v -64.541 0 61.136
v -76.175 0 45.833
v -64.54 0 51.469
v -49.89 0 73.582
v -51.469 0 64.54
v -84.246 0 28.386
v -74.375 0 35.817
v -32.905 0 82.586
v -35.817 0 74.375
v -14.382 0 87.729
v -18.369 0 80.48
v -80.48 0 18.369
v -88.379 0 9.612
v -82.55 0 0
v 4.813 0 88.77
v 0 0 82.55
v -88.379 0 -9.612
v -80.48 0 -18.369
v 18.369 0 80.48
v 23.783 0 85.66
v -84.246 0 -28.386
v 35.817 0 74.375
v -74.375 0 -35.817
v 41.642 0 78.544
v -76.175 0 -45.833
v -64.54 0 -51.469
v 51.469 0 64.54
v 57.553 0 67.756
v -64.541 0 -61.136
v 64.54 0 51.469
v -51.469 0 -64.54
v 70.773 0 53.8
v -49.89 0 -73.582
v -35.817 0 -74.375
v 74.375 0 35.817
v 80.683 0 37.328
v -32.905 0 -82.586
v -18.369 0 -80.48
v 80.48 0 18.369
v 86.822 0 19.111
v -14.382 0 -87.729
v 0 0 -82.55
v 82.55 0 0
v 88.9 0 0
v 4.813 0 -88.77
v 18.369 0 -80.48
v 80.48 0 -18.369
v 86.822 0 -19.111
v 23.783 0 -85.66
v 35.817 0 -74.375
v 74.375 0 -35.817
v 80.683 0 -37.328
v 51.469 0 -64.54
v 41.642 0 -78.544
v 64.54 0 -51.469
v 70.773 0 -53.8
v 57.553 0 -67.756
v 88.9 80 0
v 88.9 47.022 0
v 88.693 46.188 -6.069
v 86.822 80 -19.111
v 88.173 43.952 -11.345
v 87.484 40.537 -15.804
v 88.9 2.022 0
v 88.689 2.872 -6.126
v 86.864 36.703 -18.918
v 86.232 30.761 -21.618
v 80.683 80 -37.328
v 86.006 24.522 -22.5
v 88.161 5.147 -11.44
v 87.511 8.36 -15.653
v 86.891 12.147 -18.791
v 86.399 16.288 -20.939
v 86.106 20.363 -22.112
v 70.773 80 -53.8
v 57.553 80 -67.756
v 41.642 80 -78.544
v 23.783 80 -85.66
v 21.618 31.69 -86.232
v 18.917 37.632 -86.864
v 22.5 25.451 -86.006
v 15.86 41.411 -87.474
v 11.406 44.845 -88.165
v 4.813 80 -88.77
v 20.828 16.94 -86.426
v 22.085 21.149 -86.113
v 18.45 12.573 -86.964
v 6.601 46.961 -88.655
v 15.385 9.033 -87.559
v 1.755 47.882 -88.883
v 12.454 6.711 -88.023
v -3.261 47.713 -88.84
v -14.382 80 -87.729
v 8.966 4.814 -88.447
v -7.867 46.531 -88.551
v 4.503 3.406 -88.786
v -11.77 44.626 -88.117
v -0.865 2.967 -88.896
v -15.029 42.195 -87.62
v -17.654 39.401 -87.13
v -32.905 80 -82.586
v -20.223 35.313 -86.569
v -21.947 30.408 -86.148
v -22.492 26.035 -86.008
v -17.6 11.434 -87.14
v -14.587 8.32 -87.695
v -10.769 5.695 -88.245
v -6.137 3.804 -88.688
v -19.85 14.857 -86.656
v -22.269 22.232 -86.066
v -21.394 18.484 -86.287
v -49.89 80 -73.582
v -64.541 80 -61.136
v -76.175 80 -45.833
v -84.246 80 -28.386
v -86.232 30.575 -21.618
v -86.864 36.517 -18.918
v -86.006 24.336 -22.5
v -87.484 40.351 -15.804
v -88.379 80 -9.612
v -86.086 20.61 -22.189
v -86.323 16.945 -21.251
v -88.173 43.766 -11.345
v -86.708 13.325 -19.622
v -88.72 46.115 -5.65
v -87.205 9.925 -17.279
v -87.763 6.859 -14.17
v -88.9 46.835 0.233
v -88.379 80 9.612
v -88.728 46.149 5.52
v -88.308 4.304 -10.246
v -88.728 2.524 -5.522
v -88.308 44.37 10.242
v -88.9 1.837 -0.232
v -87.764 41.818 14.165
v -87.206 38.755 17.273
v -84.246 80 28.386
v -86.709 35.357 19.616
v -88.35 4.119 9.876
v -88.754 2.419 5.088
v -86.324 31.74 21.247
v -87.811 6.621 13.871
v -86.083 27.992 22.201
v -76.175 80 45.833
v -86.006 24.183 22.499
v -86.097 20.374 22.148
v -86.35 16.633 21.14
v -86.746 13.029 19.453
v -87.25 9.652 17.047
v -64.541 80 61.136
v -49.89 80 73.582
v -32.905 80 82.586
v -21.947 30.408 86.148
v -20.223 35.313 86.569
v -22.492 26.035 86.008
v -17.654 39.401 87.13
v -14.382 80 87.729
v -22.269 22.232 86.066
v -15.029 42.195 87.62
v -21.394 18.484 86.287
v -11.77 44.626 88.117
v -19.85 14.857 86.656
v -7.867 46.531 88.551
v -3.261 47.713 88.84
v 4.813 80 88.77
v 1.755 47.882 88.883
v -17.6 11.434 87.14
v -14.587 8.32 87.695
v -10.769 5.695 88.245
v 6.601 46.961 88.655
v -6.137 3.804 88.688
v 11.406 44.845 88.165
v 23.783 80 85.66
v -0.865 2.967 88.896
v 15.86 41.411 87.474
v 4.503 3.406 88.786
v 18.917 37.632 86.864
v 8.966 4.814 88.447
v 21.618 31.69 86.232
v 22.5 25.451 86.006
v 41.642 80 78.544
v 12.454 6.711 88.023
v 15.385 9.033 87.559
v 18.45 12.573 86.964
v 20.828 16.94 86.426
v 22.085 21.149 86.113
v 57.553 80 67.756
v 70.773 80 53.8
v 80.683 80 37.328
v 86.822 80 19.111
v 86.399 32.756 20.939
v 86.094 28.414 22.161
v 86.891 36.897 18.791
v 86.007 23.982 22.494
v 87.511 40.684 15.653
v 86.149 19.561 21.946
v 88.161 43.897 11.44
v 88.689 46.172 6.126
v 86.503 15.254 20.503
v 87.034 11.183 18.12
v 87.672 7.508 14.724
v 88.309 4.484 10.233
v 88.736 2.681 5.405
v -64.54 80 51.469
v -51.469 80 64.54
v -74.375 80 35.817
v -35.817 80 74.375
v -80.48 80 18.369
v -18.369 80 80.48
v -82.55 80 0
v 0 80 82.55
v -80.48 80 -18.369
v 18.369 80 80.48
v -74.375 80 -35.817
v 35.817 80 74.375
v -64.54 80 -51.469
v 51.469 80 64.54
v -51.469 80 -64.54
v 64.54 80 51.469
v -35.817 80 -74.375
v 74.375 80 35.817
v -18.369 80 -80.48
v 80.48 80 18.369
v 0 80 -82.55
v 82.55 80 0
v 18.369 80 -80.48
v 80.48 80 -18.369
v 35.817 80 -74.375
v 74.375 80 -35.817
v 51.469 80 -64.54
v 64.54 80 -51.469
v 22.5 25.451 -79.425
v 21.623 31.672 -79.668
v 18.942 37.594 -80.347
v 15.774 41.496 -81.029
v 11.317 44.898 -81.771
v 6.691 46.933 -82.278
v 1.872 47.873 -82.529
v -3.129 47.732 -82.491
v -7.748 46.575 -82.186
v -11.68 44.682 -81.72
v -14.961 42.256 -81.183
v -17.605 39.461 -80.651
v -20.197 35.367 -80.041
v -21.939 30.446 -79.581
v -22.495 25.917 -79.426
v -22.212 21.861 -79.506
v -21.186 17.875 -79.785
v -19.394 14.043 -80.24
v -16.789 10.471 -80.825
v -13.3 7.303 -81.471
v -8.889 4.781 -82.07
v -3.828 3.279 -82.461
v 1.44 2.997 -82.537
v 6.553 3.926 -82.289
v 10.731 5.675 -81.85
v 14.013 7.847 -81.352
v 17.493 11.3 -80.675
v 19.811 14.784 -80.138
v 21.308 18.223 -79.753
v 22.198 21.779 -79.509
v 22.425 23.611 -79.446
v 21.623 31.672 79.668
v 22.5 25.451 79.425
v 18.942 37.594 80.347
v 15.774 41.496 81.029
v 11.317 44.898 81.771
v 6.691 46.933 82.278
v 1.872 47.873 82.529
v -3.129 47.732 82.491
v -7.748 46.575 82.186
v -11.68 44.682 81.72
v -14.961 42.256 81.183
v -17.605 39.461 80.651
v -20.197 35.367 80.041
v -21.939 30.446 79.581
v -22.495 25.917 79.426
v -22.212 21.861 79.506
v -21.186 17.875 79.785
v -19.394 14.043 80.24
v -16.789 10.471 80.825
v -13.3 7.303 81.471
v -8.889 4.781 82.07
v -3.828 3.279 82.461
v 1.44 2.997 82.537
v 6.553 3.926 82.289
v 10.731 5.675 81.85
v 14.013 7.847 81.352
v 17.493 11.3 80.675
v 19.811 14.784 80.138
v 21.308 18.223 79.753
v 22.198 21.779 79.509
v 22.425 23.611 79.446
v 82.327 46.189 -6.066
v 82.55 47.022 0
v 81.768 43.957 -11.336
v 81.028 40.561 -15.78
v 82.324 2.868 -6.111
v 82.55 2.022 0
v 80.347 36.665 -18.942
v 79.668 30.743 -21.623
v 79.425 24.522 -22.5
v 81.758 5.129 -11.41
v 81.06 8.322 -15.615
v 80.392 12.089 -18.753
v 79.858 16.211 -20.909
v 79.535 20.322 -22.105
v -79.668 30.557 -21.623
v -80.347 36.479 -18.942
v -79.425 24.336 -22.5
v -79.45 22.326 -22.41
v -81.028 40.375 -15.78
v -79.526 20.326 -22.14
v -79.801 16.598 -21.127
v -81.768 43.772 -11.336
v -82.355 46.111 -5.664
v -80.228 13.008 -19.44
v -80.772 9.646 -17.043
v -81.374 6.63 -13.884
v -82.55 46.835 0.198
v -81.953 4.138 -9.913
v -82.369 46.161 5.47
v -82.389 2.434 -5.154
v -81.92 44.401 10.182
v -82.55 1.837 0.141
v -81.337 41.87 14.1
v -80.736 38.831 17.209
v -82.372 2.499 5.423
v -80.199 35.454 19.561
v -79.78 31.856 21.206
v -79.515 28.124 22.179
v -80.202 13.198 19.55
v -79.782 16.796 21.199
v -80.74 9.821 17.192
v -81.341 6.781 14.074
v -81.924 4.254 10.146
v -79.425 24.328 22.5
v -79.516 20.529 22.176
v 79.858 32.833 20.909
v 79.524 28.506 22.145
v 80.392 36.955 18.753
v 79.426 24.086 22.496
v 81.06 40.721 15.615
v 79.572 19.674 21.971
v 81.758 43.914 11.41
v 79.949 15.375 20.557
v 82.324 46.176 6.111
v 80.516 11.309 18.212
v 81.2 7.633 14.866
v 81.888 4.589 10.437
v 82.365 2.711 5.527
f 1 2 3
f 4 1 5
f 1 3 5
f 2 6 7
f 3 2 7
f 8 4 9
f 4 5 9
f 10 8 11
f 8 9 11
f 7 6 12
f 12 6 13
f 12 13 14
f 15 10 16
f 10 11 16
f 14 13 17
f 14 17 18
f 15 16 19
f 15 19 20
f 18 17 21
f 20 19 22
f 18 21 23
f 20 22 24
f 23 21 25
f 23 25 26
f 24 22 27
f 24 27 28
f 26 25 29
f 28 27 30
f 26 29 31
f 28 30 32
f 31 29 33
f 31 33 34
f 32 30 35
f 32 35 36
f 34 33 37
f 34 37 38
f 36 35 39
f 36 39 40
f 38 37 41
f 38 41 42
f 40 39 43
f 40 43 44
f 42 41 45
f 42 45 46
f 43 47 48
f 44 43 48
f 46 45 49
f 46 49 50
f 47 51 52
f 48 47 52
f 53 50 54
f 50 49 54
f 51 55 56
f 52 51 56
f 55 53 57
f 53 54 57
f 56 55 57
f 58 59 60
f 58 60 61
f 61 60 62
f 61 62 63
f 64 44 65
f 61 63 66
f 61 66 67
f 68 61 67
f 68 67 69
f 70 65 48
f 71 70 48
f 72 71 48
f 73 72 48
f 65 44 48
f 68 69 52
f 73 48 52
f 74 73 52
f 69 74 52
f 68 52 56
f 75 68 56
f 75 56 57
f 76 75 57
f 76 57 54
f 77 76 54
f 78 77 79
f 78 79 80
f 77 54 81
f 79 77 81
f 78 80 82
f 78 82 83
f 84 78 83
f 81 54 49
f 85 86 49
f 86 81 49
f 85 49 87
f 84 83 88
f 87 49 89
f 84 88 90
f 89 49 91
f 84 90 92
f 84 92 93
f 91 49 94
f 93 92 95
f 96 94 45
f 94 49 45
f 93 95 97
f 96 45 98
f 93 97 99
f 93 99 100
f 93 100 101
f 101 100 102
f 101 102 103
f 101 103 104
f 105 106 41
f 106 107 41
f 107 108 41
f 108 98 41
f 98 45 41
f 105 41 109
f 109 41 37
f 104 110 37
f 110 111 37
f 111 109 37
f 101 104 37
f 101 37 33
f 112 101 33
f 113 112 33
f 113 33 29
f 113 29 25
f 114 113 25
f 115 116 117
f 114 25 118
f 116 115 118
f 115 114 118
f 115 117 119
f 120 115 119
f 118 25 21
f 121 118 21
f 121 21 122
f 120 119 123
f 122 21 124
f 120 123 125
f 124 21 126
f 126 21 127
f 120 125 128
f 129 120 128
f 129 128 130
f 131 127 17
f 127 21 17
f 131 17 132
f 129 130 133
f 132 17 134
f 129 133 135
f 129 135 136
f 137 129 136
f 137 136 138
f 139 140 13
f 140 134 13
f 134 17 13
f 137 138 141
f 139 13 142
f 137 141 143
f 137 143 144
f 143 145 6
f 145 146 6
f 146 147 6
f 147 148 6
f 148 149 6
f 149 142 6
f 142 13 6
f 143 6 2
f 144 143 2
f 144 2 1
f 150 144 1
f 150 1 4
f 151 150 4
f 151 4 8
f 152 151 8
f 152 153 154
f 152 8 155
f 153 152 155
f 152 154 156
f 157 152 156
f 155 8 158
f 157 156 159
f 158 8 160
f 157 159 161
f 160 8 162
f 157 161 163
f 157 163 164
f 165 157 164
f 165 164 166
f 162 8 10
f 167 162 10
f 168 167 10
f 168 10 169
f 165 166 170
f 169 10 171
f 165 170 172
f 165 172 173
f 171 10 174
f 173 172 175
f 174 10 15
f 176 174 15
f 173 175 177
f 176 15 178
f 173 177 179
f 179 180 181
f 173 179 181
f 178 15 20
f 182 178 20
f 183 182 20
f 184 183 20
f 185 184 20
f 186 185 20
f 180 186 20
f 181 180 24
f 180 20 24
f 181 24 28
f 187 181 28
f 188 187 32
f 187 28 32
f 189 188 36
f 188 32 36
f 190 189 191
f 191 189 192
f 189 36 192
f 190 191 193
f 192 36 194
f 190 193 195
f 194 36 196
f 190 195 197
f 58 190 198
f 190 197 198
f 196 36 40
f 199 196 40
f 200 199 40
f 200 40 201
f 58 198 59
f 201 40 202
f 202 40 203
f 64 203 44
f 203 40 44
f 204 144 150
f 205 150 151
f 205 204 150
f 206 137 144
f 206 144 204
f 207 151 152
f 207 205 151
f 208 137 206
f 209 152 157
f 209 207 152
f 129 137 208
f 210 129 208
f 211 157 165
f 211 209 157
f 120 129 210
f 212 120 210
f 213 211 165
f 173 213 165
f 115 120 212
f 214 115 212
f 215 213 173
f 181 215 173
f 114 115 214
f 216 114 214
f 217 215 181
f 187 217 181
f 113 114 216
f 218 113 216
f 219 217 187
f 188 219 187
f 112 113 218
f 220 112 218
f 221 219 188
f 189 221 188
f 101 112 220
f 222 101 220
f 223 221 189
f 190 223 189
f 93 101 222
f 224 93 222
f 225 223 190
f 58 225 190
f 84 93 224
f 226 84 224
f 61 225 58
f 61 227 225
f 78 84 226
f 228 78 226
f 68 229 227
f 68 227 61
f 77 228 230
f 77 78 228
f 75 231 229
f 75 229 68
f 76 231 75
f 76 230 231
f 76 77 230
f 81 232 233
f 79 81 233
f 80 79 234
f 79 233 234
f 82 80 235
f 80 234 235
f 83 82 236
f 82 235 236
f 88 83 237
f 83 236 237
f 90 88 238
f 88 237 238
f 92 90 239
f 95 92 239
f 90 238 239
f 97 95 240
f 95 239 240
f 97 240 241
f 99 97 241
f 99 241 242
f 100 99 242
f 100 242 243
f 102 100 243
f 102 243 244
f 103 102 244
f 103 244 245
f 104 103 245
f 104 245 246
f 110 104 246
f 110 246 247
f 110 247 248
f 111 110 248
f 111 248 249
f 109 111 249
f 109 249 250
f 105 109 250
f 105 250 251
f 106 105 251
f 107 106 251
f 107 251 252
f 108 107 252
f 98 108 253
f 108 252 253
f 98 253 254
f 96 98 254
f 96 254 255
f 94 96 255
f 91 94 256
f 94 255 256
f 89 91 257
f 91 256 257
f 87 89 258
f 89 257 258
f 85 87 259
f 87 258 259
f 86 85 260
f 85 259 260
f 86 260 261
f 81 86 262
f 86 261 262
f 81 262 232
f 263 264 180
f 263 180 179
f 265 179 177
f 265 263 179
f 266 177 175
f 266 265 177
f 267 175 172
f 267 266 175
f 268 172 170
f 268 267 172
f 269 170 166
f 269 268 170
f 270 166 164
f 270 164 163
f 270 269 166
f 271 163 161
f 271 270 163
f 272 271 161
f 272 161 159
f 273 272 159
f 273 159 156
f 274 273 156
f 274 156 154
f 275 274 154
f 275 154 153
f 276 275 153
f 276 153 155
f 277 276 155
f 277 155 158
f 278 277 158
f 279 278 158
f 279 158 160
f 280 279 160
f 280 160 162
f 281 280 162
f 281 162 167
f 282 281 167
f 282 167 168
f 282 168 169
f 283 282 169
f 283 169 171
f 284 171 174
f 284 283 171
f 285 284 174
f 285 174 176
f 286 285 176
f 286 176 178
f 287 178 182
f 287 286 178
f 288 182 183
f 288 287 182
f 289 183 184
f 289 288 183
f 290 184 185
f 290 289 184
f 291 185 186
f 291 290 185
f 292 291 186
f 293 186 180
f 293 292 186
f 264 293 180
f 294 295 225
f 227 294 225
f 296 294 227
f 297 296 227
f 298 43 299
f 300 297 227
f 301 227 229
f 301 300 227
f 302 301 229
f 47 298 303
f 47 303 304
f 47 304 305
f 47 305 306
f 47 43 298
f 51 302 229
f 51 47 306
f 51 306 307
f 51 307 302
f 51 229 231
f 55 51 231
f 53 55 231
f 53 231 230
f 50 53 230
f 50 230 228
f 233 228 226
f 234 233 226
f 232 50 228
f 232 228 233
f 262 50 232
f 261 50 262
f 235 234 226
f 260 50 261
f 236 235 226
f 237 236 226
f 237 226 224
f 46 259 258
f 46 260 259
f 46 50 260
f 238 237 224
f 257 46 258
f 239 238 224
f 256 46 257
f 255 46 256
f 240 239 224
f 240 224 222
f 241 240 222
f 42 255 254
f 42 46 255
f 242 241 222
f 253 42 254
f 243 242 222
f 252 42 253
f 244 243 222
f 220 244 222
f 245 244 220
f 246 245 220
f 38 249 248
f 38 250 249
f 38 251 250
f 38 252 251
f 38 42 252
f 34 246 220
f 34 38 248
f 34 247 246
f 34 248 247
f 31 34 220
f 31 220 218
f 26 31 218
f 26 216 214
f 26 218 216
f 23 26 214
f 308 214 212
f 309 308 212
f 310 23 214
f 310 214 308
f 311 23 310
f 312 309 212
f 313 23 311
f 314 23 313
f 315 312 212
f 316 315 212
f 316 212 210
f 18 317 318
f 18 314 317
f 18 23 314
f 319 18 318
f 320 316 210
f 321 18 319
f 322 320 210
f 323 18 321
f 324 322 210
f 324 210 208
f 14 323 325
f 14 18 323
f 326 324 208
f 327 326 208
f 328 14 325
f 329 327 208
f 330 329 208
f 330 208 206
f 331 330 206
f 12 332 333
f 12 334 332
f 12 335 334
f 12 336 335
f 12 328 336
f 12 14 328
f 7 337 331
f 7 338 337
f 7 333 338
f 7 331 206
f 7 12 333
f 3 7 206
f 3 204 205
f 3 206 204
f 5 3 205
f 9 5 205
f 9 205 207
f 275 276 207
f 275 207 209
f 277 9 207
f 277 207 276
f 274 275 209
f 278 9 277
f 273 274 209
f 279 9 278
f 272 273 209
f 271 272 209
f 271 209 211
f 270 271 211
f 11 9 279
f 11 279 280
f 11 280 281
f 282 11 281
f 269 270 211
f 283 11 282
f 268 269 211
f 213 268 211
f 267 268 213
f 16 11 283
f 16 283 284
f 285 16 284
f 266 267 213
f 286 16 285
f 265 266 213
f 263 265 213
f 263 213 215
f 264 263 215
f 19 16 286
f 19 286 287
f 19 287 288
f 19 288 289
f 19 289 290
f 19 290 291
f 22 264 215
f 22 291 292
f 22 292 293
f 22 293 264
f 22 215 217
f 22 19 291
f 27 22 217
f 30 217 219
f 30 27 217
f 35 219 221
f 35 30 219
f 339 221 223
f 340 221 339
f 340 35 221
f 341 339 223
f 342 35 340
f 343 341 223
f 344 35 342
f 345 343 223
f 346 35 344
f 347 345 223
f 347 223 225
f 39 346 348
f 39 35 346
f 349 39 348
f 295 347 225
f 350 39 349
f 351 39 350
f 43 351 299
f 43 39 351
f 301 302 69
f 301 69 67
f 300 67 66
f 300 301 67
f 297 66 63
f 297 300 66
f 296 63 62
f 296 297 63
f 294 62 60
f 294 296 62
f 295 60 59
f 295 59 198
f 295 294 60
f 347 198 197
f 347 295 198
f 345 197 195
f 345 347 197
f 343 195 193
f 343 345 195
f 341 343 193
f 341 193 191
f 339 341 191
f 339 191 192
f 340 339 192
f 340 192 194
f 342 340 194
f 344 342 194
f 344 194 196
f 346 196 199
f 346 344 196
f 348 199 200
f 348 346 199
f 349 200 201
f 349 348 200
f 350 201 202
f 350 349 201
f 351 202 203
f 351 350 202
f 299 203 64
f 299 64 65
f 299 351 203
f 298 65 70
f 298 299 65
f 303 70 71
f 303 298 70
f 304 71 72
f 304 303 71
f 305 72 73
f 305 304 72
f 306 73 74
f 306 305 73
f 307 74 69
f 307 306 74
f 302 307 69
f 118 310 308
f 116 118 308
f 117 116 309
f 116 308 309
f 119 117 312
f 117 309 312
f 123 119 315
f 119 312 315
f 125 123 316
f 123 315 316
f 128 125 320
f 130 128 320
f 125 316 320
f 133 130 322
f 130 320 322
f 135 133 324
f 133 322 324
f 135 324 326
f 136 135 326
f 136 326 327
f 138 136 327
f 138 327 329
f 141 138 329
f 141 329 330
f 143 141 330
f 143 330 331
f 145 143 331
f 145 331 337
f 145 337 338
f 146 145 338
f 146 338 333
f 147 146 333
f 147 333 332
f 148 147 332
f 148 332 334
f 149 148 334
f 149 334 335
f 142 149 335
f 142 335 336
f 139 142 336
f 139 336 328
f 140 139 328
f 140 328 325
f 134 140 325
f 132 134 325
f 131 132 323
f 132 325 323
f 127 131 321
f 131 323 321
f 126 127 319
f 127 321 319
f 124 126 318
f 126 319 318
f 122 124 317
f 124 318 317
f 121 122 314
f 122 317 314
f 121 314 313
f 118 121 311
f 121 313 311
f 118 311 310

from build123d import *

# Parameters (mm, degrees)
SKETCH1_R           = 88.9
BOSS_EXTRUDE1_DEPTH = 80
SKETCH2_R           = 82.55
CUT_EXTRUDE4_DEPTH  = 90
SKETCH12_R          = 22.5
CUT_EXTRUDE5_DEPTH  = 115.64
SKETCH13_R          = 22.5
CUT_EXTRUDE6_DEPTH  = 115.64
SKETCH14_R          = 22.5
CUT_EXTRUDE7_DEPTH  = 99.64
CUT_EXTRUDE8_START  = 137.64
SKETCH15_R          = 22.5
CUT_EXTRUDE8_DEPTH  = 137.64


with BuildPart() as part:
    # Sketch1 → Boss-Extrude1 (new body)
    with BuildSketch(Plane(origin=(0, 0, 0), x_dir=(1, 0, 0), z_dir=(0, 1, 0))):
        Circle(SKETCH1_R)
    extrude(amount=BOSS_EXTRUDE1_DEPTH)

    # Sketch2 → Cut-Extrude4 (cut)
    with BuildSketch(Plane(origin=(0, 0, 0), x_dir=(1, 0, 0), z_dir=(0, 1, 0))):
        Circle(SKETCH2_R)
    extrude(amount=CUT_EXTRUDE4_DEPTH, mode=Mode.SUBTRACT)

    # Sketch12 → Cut-Extrude5 (cut)
    with BuildSketch(Plane(origin=(0, 0, 0), x_dir=(0, 0, -1), z_dir=(1, 0, 0))):
        with Locations((0, 24.336091646)):
            Circle(SKETCH12_R)
    extrude(amount=-CUT_EXTRUDE5_DEPTH, mode=Mode.SUBTRACT)

    # Sketch13 → Cut-Extrude6 (cut)
    with BuildSketch(Plane.XY):
        with Locations((0, 25.450721797)):
            Circle(SKETCH13_R)
    extrude(amount=-CUT_EXTRUDE6_DEPTH, mode=Mode.SUBTRACT)

    # Sketch14 → Cut-Extrude7 (cut)
    with BuildSketch(Plane(origin=(0, 0, 0), x_dir=(0, 0, -1), z_dir=(1, 0, 0))):
        with Locations((0, 24.521863338)):
            Circle(SKETCH14_R)
    extrude(amount=CUT_EXTRUDE7_DEPTH, mode=Mode.SUBTRACT)

    # Sketch15 → Cut-Extrude8 (cut)
    with BuildSketch(Plane.XY.offset(CUT_EXTRUDE8_START)):
        with Locations((0, 25.450721797)):
            Circle(SKETCH15_R)
    extrude(amount=-CUT_EXTRUDE8_DEPTH, mode=Mode.SUBTRACT)


solid = part.part
